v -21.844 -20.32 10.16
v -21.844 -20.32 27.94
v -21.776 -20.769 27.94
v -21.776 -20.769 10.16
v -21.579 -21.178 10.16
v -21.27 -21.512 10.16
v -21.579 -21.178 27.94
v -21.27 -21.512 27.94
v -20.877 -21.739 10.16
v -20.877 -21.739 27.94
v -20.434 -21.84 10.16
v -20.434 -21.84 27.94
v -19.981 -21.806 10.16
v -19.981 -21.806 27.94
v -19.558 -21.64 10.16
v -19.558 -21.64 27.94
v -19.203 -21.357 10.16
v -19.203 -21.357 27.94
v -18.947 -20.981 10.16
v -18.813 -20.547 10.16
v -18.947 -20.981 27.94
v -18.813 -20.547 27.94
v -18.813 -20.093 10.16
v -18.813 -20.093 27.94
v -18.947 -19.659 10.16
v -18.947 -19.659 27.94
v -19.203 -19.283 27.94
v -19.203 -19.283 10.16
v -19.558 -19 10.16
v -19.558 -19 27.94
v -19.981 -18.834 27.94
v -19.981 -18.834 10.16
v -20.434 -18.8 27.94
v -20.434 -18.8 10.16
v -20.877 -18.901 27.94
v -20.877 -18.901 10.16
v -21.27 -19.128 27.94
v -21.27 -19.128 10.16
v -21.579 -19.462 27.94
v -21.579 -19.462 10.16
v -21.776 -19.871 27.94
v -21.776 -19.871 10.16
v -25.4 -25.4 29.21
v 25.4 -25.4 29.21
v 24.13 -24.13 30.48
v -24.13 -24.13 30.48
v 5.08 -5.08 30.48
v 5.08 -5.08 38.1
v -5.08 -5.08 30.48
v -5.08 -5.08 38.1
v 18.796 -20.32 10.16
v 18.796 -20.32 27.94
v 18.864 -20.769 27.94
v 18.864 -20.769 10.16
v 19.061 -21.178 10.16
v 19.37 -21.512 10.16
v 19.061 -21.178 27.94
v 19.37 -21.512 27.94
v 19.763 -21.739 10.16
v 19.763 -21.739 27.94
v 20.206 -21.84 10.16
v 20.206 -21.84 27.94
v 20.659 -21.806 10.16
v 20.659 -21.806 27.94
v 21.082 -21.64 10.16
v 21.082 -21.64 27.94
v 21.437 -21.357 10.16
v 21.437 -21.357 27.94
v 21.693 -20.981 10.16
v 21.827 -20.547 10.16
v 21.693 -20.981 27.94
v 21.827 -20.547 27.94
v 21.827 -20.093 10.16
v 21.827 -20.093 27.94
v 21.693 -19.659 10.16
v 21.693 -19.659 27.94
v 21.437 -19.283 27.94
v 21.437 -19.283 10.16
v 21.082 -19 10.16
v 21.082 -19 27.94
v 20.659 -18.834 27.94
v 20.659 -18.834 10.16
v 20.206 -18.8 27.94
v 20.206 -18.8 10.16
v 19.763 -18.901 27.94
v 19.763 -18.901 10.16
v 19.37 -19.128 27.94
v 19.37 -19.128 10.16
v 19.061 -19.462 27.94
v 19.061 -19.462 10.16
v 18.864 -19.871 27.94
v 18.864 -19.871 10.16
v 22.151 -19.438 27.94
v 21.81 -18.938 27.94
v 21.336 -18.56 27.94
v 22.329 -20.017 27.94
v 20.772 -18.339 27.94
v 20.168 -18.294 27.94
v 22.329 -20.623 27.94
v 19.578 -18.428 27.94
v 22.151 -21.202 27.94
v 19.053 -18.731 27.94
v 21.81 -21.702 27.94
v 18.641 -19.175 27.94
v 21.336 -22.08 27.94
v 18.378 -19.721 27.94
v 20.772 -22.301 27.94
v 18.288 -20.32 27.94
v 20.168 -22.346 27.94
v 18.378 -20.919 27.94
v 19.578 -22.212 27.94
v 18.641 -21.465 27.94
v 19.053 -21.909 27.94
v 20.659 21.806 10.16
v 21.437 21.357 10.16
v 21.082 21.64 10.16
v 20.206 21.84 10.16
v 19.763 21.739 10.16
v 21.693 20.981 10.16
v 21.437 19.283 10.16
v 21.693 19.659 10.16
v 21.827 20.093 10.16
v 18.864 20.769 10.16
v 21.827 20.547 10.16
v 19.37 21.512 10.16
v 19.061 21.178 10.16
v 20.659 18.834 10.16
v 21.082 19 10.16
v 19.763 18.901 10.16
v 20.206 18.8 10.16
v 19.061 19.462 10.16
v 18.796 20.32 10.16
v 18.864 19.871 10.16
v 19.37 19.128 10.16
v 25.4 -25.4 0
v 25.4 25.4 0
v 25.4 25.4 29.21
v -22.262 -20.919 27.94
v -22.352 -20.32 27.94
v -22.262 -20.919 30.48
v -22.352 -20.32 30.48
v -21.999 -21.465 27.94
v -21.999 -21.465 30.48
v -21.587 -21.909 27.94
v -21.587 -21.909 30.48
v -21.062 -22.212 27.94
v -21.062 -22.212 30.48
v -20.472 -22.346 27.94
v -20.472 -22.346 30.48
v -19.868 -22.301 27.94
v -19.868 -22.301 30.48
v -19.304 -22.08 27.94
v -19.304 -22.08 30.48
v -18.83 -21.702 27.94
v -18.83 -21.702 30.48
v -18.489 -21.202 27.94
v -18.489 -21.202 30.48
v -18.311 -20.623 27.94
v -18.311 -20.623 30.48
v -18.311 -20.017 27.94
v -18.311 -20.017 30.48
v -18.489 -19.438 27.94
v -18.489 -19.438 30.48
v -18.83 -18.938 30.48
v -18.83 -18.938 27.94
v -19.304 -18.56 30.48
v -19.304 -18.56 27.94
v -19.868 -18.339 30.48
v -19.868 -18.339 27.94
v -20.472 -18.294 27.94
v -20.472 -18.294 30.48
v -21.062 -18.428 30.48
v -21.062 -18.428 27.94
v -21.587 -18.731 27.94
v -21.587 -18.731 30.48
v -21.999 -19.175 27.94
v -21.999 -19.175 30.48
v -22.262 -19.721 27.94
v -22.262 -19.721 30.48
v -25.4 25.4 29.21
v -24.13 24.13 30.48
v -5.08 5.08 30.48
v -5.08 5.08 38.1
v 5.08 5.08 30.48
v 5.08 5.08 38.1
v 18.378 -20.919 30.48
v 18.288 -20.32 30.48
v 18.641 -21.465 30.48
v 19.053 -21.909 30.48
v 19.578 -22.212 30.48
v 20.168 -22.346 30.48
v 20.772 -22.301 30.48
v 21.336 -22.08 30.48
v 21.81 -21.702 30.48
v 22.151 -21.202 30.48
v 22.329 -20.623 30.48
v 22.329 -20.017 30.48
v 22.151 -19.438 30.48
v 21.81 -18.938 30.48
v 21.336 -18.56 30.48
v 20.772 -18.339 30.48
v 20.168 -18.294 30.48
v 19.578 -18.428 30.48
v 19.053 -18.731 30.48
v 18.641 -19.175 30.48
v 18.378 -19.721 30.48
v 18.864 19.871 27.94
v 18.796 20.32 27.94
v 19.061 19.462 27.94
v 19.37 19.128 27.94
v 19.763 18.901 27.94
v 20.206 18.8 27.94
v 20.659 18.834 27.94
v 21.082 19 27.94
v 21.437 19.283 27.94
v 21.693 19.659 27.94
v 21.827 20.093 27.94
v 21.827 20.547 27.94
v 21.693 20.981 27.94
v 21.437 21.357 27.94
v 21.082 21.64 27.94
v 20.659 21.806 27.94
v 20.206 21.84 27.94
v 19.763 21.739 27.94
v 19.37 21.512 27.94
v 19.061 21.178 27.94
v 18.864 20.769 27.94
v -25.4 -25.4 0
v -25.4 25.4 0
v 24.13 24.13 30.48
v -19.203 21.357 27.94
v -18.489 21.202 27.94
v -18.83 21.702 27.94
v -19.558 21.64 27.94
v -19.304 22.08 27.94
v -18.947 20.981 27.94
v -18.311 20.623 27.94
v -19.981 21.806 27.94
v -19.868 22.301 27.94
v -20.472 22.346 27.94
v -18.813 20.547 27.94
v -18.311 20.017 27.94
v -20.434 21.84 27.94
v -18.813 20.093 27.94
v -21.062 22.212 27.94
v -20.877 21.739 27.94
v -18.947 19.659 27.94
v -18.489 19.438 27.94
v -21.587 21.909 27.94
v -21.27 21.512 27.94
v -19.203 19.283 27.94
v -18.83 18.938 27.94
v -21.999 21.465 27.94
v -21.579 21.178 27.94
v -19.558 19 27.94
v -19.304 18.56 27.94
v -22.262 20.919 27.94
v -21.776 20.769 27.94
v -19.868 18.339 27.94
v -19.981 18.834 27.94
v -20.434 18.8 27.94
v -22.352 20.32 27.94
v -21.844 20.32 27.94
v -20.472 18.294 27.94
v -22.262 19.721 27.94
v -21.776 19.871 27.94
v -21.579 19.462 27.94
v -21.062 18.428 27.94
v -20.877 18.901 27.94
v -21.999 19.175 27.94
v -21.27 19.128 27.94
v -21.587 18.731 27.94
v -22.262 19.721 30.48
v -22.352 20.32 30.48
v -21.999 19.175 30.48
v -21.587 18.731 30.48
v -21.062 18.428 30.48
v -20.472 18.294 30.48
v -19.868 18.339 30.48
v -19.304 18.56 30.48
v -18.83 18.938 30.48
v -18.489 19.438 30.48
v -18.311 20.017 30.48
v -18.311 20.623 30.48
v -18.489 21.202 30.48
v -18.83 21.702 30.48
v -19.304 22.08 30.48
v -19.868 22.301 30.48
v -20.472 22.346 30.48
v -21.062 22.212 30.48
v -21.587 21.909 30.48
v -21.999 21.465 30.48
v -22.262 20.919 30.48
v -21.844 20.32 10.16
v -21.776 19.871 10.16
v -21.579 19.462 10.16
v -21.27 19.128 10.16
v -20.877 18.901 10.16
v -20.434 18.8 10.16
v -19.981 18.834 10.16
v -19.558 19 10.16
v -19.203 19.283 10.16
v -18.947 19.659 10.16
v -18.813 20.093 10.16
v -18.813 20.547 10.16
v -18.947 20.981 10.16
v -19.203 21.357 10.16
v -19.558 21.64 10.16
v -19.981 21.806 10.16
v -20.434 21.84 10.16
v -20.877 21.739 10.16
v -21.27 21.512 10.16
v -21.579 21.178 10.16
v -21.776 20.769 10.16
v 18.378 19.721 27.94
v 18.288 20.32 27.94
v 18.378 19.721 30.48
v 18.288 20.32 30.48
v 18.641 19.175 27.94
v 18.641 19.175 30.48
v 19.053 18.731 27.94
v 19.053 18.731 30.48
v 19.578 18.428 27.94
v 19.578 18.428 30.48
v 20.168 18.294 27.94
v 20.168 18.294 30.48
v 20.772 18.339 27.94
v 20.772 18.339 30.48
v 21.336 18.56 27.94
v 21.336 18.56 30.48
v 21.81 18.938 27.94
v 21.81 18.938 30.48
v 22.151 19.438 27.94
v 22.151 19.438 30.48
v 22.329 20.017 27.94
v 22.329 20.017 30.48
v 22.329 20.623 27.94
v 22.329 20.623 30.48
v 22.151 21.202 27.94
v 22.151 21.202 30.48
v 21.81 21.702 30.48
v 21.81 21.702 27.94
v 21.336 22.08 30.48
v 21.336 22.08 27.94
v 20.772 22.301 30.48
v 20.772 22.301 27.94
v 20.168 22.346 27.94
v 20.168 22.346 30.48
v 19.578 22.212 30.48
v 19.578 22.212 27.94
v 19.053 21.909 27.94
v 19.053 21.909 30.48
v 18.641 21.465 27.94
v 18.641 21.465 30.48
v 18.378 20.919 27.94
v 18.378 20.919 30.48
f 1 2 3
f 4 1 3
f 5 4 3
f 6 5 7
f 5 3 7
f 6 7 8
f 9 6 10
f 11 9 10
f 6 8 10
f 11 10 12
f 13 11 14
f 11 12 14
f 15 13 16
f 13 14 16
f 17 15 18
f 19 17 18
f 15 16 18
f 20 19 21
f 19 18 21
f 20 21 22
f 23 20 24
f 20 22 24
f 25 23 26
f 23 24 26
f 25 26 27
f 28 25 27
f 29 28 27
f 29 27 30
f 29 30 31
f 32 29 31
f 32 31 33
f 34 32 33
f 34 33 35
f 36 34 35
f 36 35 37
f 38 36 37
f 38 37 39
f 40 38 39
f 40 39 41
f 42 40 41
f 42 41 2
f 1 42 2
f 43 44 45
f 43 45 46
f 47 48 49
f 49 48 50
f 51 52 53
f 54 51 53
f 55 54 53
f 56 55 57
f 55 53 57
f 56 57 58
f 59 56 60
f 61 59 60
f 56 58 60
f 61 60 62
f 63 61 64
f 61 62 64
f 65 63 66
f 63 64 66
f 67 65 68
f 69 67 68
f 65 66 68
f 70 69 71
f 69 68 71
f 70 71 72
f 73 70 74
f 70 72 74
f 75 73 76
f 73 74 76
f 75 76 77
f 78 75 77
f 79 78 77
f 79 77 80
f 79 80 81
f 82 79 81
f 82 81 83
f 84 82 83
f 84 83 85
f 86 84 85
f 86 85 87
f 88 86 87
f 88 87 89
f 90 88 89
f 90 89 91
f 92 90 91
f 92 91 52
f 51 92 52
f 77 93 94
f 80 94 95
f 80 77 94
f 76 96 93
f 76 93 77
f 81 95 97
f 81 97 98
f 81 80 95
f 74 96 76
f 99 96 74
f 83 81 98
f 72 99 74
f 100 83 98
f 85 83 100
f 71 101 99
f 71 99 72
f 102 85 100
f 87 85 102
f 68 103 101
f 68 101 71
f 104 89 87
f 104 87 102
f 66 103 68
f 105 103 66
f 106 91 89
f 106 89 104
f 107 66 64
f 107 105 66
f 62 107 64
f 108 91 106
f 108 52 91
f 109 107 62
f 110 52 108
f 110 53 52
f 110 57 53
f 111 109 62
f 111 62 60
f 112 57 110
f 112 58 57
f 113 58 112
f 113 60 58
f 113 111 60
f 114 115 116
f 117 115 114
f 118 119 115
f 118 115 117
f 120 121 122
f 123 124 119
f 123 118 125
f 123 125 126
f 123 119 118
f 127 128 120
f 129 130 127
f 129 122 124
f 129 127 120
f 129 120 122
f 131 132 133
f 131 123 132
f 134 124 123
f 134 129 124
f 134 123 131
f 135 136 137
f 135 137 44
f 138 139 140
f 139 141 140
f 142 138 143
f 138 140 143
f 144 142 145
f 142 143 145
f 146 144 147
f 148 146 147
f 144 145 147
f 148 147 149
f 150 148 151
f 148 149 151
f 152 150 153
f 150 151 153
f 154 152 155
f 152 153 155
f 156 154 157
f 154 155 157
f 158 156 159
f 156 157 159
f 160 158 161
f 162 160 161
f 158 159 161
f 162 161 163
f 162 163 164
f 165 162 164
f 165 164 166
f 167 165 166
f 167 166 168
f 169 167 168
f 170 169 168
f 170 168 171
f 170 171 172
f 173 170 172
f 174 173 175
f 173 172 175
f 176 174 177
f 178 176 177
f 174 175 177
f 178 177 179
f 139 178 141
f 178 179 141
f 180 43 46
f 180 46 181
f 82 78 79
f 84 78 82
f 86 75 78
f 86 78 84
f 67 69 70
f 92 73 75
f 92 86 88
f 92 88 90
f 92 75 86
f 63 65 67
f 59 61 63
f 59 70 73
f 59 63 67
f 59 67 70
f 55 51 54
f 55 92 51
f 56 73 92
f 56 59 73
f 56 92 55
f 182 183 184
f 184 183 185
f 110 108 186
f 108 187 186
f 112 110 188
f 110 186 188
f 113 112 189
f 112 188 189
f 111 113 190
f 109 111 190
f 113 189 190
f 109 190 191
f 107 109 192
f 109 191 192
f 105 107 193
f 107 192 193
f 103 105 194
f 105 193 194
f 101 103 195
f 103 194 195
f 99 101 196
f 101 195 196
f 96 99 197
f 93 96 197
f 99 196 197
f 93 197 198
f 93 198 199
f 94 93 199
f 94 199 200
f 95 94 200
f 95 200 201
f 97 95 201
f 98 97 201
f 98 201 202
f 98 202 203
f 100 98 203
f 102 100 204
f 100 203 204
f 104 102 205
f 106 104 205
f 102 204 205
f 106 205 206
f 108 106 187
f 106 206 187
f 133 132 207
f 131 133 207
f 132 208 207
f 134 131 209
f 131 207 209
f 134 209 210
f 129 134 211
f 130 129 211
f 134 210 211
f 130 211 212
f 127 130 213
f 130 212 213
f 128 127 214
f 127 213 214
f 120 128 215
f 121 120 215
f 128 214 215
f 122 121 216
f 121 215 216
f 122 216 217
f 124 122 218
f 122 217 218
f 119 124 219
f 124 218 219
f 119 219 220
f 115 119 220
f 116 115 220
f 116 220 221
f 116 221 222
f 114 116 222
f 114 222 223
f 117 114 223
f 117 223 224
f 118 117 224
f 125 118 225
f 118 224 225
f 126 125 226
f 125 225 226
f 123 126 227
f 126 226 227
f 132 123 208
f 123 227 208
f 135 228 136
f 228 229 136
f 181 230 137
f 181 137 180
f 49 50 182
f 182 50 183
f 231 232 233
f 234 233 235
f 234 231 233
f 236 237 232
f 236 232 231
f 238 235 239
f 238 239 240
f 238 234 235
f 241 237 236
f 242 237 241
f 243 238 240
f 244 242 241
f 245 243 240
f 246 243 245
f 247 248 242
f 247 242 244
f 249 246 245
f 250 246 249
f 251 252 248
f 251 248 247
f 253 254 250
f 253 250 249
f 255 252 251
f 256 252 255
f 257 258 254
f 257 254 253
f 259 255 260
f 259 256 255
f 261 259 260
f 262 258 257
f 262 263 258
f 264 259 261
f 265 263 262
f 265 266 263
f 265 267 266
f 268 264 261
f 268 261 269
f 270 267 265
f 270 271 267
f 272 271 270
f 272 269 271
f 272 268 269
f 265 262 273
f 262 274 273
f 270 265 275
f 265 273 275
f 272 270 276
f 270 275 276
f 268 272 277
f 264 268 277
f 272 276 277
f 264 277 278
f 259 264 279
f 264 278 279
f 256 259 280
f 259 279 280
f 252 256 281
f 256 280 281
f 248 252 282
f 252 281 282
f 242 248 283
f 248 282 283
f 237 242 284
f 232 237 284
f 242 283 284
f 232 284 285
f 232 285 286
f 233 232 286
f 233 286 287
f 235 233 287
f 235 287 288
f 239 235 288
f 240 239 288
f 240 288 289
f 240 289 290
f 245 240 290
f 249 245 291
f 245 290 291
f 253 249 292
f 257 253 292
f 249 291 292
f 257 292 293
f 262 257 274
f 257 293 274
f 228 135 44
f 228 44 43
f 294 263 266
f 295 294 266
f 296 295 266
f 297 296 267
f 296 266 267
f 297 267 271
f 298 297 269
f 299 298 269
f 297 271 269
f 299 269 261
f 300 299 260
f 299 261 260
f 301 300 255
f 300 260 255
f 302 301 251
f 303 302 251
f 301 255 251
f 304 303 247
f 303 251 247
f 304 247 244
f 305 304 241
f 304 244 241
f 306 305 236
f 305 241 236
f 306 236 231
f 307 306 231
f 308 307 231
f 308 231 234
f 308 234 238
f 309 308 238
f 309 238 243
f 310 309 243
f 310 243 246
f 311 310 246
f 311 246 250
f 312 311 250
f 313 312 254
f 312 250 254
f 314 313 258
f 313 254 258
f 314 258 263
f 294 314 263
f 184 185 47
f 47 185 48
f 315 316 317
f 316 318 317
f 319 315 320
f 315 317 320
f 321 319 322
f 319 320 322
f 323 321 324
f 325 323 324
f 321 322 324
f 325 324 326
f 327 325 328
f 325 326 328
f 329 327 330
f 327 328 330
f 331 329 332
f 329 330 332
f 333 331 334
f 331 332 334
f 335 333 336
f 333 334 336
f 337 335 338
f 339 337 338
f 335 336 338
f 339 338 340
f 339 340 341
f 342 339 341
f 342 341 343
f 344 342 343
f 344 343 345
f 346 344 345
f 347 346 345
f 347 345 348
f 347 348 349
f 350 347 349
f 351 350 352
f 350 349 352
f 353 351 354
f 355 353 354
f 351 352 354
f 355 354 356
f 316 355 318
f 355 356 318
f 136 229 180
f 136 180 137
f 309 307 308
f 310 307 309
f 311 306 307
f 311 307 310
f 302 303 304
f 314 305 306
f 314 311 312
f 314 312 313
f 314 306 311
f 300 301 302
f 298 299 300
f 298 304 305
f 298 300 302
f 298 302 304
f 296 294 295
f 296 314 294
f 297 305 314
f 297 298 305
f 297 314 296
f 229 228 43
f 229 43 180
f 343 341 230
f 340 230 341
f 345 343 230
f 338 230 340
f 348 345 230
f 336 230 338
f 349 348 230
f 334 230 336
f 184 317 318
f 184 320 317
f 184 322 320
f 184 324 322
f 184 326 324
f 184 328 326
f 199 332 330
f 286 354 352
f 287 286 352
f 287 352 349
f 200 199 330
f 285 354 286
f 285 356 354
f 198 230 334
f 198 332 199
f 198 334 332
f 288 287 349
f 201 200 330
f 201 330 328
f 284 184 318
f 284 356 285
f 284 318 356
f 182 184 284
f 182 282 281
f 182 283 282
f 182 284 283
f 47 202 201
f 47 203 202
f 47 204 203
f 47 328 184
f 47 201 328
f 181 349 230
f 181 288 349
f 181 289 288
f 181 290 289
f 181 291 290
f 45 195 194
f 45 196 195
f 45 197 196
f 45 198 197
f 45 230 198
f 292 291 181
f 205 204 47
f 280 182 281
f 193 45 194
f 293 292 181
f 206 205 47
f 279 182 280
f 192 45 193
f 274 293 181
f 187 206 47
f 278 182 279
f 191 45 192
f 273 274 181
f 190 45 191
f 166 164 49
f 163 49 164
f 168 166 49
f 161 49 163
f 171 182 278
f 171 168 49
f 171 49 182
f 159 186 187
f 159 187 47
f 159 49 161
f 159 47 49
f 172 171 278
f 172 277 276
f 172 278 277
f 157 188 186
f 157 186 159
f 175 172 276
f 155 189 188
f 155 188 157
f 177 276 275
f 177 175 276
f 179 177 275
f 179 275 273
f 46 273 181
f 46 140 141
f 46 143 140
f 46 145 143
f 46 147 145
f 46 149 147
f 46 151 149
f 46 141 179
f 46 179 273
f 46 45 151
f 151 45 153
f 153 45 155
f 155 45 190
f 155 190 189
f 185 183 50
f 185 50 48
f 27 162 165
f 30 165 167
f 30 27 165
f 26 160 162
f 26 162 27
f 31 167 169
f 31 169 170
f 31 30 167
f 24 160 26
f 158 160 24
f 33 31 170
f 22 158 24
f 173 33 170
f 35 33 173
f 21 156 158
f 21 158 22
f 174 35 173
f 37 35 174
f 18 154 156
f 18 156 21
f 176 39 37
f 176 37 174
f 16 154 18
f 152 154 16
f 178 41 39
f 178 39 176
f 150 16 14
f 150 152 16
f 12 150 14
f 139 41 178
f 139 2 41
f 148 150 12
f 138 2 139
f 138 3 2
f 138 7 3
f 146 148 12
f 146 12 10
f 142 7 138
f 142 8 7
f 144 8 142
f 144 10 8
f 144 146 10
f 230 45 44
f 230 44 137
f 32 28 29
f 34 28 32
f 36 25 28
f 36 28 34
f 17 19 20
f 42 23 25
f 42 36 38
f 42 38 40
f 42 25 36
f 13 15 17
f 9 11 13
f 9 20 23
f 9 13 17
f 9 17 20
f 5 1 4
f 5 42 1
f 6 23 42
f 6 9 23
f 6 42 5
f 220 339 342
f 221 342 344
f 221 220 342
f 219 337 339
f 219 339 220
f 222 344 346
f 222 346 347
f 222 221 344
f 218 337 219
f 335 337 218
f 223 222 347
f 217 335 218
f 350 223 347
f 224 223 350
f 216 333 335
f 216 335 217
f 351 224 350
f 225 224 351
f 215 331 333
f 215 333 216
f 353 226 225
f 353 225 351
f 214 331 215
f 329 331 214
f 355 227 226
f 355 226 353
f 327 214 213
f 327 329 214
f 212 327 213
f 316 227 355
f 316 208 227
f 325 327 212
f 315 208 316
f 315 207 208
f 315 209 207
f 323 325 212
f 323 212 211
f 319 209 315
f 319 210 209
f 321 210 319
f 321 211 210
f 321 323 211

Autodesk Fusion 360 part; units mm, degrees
sketch "Sketch1" plane through (0, 0, 0) normal (0, 0, 1) x (1, 0, 0)
  line L0 (-25.4, 25.4) -> (25.4, 25.4)
  line L1 (25.4, 25.4) -> (25.4, -25.4)
  line L2 (25.4, -25.4) -> (-25.4, -25.4)
  line L3 (-25.4, -25.4) -> (-25.4, 25.4)
  line L4 (-25.4, 25.4) -> (25.4, -25.4) construction
  line L5 (25.4, 25.4) -> (-25.4, -25.4) construction
  dimension "d1" = 50.8
  dimension "d2" = 50.8
extrude "Extrude1" add sketch "Sketch1" along normal blind 38.1
sketch "Sketch2" plane through (0, 0, 38.1) normal (0, 0, 1) x (-1, 0, 0)
  line L0 (25.4, 25.4) -> (-25.4, 25.4)
  line L1 (-25.4, 25.4) -> (-25.4, -25.4)
  line L2 (-25.4, -25.4) -> (25.4, -25.4)
  line L3 (25.4, -25.4) -> (25.4, 25.4)
  line L4 (5.08, -5.08) -> (-5.08, -5.08)
  line L5 (-5.08, -5.08) -> (-5.08, 5.08)
  line L6 (-5.08, 5.08) -> (5.08, 5.08)
  line L7 (5.08, 5.08) -> (5.08, -5.08)
  line L8 (5.08, -5.08) -> (-5.08, 5.08) construction
  line L9 (-5.08, -5.08) -> (5.08, 5.08) construction
  line L10 (-25.4, -25.4) -> (25.4, -25.4)
  line L11 (25.4, 25.4) -> (25.4, -25.4)
  line L12 (25.4, 25.4) -> (-25.4, 25.4)
  line L13 (-25.4, -25.4) -> (-25.4, 25.4)
  dimension "d5" = 10.16
  dimension "d6" = 10.16
extrude "Extrude2" cut sketch "Sketch2" against normal blind 7.62
sketch "Sketch3" plane through (0, 0, 30.48) normal (0, 0, 1) x (-1, 0, 0)
  line L0 (-5.08, 5.08) -> (5.08, 5.08)
  line L1 (5.08, 5.08) -> (5.08, -5.08)
  line L2 (5.08, -5.08) -> (-5.08, -5.08)
  line L3 (-5.08, -5.08) -> (-5.08, 5.08)
  line L4 (25.4, 25.4) -> (-25.4, 25.4)
  line L5 (-25.4, 25.4) -> (-25.4, -25.4)
  line L6 (-25.4, -25.4) -> (25.4, -25.4)
  line L7 (25.4, -25.4) -> (25.4, 25.4)
  circle A0 centre (20.32, 20.32) radius 2.032
  circle A1 centre (-20.32, 20.32) radius 2.032
  circle A2 centre (-20.32, -20.32) radius 2.032
  circle A3 centre (20.32, -20.32) radius 2.032
  dimension "d11" = 4.064
  dimension "d13" = 360
  dimension "d14" = 5.08
  dimension "d15" = 5.08
  dimension "d17" = 5.08
  dimension "d18" = 5.08
  dimension "d19" = 5.08
extrude "Extrude3" cut sketch "Sketch3" against normal blind 2.54 contours A0 | A1 | A2 | A3
sketch "Sketch4" plane through (0, 0, 30.48) normal (0, 0, 1) x (-1, 0, 0)
  circle A0 centre (-20.32, 20.32) radius 2.032
  circle A1 centre (20.32, 20.32) radius 2.032
  circle A2 centre (-20.32, -20.32) radius 2.032
  circle A3 centre (20.32, -20.32) radius 2.032
  line L0 (-5.08, 5.08) -> (5.08, 5.08)
  line L1 (5.08, 5.08) -> (5.08, -5.08)
  line L2 (5.08, -5.08) -> (-5.08, -5.08)
  line L3 (-5.08, -5.08) -> (-5.08, 5.08)
  line L4 (25.4, 25.4) -> (-25.4, 25.4)
  line L5 (-25.4, 25.4) -> (-25.4, -25.4)
  line L6 (-25.4, -25.4) -> (25.4, -25.4)
  line L7 (25.4, -25.4) -> (25.4, 25.4)
  circle A4 centre (20.32, -20.32) radius 1.524
  circle A5 centre (20.32, 20.32) radius 1.524
  circle A6 centre (-20.32, 20.32) radius 1.524
  circle A7 centre (-20.32, -20.32) radius 1.524
  dimension "d22" = 3.048
  dimension "d24" = 360
extrude "Extrude4" cut sketch "Sketch4" against normal blind 20.32 contours A4 | A5 | A6 | A7
chamfer "Chamfer1" distance 1.27 angle 45 4 edges at (0, -25.4, 30.48) (25.4, 0, 30.48) (0, 25.4, 30.48) (-25.4, 0, 30.48)
